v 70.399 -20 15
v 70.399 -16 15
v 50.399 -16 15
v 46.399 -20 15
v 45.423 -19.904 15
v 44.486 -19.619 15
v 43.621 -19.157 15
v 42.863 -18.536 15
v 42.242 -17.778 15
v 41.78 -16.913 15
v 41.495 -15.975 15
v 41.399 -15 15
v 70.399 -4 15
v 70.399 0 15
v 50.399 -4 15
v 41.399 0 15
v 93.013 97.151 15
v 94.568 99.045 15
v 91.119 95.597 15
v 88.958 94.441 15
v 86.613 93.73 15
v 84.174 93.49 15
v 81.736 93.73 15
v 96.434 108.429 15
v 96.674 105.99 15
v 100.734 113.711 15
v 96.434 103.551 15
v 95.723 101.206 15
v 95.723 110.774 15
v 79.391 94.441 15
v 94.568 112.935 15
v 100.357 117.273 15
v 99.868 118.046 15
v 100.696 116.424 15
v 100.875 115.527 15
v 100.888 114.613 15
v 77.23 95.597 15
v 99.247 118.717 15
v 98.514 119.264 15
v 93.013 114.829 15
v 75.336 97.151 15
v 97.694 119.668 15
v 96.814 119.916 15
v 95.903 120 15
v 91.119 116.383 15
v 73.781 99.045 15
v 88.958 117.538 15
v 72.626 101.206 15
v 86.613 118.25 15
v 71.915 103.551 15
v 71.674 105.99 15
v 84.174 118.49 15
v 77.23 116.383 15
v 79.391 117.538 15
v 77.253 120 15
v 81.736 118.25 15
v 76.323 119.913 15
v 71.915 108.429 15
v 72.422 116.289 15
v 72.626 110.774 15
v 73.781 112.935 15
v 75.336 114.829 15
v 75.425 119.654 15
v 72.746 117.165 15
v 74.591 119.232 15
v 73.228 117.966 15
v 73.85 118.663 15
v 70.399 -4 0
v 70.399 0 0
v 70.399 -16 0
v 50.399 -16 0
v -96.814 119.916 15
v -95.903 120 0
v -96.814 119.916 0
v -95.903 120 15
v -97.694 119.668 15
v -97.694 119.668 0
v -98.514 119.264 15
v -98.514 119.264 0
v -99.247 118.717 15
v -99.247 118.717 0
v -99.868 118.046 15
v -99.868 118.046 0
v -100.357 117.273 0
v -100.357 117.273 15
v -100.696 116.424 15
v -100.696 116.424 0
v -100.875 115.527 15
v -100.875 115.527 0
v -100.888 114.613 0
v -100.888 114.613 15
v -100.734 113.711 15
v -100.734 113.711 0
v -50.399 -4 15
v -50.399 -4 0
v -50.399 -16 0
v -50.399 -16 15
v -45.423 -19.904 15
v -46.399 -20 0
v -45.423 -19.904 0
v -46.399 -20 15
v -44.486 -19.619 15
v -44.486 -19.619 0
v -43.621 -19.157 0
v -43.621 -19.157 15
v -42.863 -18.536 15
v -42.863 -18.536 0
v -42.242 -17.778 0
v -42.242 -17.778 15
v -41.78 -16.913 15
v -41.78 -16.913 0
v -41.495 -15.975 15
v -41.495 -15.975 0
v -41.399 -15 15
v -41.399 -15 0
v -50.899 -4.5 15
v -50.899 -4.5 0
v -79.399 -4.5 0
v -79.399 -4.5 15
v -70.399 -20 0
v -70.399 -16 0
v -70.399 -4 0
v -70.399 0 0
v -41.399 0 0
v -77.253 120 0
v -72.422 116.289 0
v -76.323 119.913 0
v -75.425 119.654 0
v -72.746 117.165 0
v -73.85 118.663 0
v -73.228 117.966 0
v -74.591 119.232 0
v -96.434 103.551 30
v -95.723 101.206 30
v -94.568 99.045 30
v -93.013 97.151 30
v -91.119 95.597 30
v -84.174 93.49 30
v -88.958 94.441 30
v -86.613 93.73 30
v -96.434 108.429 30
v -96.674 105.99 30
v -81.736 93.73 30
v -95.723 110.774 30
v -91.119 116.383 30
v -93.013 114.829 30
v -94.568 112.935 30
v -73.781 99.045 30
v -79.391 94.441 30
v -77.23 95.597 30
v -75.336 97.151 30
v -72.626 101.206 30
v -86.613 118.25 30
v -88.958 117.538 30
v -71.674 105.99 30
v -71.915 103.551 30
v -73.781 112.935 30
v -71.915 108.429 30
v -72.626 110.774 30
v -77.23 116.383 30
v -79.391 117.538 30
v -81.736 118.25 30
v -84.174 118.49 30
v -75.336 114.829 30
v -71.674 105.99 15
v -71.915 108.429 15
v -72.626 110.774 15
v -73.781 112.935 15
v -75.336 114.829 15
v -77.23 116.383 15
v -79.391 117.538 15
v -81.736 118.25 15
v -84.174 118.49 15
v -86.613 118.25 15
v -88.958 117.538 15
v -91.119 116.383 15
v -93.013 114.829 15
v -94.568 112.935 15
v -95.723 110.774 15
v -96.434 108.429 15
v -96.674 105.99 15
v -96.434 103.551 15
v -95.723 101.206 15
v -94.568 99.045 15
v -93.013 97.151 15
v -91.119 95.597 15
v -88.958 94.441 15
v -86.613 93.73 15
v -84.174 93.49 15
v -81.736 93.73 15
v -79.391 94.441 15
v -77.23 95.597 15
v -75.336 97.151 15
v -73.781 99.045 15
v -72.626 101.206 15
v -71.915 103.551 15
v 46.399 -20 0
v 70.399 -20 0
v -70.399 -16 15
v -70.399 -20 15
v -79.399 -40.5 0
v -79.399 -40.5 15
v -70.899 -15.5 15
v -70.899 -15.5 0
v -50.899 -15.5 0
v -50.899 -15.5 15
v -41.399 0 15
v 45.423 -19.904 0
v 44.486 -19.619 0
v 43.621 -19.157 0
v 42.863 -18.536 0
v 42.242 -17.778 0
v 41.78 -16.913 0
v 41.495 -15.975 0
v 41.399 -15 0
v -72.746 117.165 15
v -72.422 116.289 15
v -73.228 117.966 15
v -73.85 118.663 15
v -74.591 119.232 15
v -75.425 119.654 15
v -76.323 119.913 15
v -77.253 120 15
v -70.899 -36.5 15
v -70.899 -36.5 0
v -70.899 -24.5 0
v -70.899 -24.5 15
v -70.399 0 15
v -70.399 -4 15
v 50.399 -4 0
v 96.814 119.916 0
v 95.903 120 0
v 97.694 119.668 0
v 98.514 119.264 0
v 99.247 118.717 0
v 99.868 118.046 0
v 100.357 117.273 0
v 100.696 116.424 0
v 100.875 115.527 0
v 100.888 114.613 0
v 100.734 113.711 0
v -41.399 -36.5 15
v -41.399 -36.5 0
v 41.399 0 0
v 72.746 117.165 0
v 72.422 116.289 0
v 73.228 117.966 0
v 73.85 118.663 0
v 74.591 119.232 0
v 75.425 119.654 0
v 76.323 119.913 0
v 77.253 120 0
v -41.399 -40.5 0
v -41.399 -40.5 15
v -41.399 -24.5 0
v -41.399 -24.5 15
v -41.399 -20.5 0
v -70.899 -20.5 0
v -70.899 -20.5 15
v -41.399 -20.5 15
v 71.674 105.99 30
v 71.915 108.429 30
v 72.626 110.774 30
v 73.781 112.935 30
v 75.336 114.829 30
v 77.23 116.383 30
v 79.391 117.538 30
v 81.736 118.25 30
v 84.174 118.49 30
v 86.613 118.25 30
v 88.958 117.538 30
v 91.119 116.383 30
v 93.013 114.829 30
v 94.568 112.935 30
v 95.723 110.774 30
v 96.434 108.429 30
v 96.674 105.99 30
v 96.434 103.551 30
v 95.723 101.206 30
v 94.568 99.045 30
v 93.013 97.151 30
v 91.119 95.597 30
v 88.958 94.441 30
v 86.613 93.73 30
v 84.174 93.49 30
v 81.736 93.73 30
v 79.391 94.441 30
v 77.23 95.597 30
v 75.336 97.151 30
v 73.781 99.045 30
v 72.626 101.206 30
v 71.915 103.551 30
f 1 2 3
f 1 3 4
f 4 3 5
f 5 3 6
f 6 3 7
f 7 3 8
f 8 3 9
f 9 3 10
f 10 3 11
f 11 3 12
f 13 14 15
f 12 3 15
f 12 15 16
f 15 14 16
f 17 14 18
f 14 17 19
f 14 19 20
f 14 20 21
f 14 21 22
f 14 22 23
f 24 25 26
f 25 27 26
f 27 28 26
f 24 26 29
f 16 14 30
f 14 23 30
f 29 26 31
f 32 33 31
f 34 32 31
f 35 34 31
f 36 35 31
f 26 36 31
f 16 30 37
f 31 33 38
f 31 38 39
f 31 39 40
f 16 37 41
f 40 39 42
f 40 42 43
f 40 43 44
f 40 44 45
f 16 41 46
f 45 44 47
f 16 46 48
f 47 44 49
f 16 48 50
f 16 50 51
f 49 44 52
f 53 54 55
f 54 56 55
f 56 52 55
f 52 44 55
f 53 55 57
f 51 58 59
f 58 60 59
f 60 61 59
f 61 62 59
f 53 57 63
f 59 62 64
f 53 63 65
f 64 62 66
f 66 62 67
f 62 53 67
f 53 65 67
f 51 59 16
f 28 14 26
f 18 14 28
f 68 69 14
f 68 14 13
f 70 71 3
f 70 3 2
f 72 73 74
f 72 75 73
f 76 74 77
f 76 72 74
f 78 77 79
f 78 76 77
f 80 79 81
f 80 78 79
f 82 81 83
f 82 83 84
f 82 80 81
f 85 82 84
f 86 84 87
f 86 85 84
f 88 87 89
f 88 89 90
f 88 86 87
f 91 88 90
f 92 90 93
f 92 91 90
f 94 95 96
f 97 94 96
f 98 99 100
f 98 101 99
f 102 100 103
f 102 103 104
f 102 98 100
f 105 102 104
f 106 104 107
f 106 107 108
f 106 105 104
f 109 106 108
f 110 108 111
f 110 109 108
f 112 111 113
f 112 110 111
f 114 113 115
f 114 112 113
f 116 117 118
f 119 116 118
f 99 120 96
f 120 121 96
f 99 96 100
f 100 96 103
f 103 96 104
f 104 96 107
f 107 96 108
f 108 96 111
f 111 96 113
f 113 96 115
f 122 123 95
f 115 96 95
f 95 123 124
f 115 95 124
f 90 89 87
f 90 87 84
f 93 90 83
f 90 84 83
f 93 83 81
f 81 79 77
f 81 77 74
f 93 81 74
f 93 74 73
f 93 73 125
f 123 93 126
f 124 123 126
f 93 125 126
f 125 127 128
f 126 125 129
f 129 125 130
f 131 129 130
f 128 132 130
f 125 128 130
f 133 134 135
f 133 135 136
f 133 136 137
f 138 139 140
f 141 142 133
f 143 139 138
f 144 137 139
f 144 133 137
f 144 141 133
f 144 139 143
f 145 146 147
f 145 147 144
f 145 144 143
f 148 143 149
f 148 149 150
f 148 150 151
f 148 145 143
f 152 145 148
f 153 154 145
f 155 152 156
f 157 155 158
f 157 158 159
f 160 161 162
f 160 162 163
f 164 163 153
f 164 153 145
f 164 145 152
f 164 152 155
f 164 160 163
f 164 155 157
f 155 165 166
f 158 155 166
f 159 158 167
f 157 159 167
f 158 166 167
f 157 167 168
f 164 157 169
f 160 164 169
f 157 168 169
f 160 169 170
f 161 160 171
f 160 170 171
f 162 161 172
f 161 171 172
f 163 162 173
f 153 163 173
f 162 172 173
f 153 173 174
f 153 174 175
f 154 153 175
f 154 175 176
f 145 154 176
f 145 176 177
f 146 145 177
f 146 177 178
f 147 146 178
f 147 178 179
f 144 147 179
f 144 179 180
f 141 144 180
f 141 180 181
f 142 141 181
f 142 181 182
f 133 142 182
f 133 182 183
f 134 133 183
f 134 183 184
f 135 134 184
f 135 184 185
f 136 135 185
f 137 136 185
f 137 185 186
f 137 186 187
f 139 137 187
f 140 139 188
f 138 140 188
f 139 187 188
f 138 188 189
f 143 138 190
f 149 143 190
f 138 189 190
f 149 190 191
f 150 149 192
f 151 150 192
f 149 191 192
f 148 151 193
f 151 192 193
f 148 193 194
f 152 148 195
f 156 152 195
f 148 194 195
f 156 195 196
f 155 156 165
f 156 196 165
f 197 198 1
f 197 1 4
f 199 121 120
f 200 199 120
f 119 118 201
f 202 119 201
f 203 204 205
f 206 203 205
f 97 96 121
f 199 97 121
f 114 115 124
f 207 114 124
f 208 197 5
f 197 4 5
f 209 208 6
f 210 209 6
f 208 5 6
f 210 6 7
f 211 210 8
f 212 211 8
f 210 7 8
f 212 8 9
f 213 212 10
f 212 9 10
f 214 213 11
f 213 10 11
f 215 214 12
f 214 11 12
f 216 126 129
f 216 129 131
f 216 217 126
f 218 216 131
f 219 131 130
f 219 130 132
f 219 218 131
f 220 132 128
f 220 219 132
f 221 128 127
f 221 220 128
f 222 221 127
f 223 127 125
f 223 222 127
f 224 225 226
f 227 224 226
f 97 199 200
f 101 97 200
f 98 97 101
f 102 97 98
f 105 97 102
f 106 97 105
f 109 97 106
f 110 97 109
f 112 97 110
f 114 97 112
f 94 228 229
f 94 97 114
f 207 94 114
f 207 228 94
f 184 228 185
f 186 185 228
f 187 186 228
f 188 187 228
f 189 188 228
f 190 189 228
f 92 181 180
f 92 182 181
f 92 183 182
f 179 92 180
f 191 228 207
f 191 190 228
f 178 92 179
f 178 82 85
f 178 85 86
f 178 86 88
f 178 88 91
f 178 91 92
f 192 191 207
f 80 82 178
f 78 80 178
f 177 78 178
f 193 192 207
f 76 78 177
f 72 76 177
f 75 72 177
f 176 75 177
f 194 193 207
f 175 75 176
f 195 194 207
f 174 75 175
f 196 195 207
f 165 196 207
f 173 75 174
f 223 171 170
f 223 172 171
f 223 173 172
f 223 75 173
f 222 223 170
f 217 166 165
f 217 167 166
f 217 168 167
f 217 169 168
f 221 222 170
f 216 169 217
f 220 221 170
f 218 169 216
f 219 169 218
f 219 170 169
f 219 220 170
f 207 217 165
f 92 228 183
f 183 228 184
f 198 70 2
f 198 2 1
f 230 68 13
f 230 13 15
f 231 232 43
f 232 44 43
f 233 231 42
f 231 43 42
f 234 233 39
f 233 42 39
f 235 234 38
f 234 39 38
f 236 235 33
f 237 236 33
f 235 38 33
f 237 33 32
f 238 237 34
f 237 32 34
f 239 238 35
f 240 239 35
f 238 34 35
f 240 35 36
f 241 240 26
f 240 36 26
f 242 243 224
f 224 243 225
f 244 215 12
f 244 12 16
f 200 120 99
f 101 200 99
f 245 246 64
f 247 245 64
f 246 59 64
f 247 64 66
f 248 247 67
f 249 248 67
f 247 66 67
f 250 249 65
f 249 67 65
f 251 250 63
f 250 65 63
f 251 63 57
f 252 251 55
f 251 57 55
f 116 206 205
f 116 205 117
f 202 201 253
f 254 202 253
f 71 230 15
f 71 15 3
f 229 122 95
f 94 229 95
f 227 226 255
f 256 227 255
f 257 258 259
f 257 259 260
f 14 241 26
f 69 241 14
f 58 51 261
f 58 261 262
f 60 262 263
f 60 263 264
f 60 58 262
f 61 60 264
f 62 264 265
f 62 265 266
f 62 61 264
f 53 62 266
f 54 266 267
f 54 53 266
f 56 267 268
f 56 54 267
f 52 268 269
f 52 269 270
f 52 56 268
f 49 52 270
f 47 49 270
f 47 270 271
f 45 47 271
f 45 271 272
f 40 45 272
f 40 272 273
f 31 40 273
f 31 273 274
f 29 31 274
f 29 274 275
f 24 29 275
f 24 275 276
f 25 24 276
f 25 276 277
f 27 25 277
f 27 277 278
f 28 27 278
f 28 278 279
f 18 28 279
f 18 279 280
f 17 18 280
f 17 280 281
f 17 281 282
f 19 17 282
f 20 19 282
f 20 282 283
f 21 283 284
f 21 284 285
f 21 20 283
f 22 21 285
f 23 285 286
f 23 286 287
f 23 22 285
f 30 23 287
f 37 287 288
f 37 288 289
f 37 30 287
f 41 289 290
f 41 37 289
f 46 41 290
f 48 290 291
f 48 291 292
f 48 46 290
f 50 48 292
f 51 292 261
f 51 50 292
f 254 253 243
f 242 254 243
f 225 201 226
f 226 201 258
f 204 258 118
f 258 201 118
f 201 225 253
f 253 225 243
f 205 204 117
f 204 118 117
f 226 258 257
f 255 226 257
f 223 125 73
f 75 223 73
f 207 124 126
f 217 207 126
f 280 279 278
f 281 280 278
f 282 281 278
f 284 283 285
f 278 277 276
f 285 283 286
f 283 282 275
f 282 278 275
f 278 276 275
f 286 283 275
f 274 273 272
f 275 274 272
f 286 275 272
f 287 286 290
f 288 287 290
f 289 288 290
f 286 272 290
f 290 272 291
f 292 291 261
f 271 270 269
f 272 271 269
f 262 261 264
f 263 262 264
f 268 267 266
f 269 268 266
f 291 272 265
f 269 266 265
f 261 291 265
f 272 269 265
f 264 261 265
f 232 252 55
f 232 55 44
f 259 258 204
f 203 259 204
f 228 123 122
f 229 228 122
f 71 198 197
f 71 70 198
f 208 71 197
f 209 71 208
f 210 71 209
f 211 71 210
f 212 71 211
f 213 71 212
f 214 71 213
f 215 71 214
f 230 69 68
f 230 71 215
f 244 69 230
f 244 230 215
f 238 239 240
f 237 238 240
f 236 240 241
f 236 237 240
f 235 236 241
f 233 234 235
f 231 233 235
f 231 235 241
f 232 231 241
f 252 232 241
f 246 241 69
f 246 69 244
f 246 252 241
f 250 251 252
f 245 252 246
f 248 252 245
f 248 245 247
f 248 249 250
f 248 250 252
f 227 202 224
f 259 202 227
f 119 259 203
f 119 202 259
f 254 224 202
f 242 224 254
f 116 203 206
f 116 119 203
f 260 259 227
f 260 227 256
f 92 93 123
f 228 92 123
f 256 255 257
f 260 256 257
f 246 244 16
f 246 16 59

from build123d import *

# Parameters (mm, degrees)
F0_R     = 12.5
F1_DEPTH = 15
F2_DEPTH = 30
F3_R     = 5
F0_W     = 29.5
F0_H     = 4
F5_DEPTH = 15


# Not quite as in the source:
# - a feature names something its author has since deleted; it is built from what else it names


with BuildPart() as f1:
    # F0 (on Top) → F1 (new body)
    with BuildSketch(Plane.XY):
        Polygon((-70.3989224725, -16), (-70.3989224725, -20), (-41.3989224725, -20), (-41.3989224725, 0), (-70.3989224725, 0), (-70.3989224725, -4), (-50.3989224725, -4), (-50.3989224725, -16), align=None)
        Polygon((-70.3989224725, 0), (-41.3989224725, 0), (-73.4119985036, 120), (-102.4119985036, 120), align=None)
        with Locations((-84.1744648133, 105.989973522)):
            Circle(F0_R, mode=Mode.SUBTRACT)
    extrude(amount=F1_DEPTH)

    # F0 (on Top) → F2 (join)
    with BuildSketch(Plane.XY):
        with Locations((-84.1744648133, 105.989973522)):
            Circle(F0_R)
    extrude(amount=F2_DEPTH)

    # F3
    f3_edges = [f1.edges().sort_by_distance(p)[0] for p in [
        (-41.398922, -20, 7.5),
        (-73.411999, 120, 7.5),
        (-102.411999, 120, 7.5),
    ]]
    fillet(f3_edges, radius=F3_R)


with BuildPart() as f4_1:
    # F4: instance of F1
    add(f1.part.mirror(Plane.YZ))


with BuildPart() as f5:
    # F0 (on Top) → F5 (new body)
    with BuildSketch(Plane.XY):
        Polygon((-70.8989224725, -15.5), (-79.3989224725, -15.5), (-79.3989224725, -40.5), (-41.3989224725, -40.5), (-41.3989224725, -36.5), (-70.8989224725, -36.5), (-70.8989224725, -24.5), (-70.8989224725, -20.5), align=None)
        Polygon((-50.8989224725, -15.5), (-50.8989224725, -4.5), (-79.3989224725, -4.5), (-79.3989224725, -15.5), (-70.8989224725, -15.5), align=None)
        with Locations((-56.1489224725, -22.5)):
            Rectangle(F0_W, F0_H)
    extrude(amount=F5_DEPTH)


solid = Compound([f1.part, f4_1.part, f5.part])
